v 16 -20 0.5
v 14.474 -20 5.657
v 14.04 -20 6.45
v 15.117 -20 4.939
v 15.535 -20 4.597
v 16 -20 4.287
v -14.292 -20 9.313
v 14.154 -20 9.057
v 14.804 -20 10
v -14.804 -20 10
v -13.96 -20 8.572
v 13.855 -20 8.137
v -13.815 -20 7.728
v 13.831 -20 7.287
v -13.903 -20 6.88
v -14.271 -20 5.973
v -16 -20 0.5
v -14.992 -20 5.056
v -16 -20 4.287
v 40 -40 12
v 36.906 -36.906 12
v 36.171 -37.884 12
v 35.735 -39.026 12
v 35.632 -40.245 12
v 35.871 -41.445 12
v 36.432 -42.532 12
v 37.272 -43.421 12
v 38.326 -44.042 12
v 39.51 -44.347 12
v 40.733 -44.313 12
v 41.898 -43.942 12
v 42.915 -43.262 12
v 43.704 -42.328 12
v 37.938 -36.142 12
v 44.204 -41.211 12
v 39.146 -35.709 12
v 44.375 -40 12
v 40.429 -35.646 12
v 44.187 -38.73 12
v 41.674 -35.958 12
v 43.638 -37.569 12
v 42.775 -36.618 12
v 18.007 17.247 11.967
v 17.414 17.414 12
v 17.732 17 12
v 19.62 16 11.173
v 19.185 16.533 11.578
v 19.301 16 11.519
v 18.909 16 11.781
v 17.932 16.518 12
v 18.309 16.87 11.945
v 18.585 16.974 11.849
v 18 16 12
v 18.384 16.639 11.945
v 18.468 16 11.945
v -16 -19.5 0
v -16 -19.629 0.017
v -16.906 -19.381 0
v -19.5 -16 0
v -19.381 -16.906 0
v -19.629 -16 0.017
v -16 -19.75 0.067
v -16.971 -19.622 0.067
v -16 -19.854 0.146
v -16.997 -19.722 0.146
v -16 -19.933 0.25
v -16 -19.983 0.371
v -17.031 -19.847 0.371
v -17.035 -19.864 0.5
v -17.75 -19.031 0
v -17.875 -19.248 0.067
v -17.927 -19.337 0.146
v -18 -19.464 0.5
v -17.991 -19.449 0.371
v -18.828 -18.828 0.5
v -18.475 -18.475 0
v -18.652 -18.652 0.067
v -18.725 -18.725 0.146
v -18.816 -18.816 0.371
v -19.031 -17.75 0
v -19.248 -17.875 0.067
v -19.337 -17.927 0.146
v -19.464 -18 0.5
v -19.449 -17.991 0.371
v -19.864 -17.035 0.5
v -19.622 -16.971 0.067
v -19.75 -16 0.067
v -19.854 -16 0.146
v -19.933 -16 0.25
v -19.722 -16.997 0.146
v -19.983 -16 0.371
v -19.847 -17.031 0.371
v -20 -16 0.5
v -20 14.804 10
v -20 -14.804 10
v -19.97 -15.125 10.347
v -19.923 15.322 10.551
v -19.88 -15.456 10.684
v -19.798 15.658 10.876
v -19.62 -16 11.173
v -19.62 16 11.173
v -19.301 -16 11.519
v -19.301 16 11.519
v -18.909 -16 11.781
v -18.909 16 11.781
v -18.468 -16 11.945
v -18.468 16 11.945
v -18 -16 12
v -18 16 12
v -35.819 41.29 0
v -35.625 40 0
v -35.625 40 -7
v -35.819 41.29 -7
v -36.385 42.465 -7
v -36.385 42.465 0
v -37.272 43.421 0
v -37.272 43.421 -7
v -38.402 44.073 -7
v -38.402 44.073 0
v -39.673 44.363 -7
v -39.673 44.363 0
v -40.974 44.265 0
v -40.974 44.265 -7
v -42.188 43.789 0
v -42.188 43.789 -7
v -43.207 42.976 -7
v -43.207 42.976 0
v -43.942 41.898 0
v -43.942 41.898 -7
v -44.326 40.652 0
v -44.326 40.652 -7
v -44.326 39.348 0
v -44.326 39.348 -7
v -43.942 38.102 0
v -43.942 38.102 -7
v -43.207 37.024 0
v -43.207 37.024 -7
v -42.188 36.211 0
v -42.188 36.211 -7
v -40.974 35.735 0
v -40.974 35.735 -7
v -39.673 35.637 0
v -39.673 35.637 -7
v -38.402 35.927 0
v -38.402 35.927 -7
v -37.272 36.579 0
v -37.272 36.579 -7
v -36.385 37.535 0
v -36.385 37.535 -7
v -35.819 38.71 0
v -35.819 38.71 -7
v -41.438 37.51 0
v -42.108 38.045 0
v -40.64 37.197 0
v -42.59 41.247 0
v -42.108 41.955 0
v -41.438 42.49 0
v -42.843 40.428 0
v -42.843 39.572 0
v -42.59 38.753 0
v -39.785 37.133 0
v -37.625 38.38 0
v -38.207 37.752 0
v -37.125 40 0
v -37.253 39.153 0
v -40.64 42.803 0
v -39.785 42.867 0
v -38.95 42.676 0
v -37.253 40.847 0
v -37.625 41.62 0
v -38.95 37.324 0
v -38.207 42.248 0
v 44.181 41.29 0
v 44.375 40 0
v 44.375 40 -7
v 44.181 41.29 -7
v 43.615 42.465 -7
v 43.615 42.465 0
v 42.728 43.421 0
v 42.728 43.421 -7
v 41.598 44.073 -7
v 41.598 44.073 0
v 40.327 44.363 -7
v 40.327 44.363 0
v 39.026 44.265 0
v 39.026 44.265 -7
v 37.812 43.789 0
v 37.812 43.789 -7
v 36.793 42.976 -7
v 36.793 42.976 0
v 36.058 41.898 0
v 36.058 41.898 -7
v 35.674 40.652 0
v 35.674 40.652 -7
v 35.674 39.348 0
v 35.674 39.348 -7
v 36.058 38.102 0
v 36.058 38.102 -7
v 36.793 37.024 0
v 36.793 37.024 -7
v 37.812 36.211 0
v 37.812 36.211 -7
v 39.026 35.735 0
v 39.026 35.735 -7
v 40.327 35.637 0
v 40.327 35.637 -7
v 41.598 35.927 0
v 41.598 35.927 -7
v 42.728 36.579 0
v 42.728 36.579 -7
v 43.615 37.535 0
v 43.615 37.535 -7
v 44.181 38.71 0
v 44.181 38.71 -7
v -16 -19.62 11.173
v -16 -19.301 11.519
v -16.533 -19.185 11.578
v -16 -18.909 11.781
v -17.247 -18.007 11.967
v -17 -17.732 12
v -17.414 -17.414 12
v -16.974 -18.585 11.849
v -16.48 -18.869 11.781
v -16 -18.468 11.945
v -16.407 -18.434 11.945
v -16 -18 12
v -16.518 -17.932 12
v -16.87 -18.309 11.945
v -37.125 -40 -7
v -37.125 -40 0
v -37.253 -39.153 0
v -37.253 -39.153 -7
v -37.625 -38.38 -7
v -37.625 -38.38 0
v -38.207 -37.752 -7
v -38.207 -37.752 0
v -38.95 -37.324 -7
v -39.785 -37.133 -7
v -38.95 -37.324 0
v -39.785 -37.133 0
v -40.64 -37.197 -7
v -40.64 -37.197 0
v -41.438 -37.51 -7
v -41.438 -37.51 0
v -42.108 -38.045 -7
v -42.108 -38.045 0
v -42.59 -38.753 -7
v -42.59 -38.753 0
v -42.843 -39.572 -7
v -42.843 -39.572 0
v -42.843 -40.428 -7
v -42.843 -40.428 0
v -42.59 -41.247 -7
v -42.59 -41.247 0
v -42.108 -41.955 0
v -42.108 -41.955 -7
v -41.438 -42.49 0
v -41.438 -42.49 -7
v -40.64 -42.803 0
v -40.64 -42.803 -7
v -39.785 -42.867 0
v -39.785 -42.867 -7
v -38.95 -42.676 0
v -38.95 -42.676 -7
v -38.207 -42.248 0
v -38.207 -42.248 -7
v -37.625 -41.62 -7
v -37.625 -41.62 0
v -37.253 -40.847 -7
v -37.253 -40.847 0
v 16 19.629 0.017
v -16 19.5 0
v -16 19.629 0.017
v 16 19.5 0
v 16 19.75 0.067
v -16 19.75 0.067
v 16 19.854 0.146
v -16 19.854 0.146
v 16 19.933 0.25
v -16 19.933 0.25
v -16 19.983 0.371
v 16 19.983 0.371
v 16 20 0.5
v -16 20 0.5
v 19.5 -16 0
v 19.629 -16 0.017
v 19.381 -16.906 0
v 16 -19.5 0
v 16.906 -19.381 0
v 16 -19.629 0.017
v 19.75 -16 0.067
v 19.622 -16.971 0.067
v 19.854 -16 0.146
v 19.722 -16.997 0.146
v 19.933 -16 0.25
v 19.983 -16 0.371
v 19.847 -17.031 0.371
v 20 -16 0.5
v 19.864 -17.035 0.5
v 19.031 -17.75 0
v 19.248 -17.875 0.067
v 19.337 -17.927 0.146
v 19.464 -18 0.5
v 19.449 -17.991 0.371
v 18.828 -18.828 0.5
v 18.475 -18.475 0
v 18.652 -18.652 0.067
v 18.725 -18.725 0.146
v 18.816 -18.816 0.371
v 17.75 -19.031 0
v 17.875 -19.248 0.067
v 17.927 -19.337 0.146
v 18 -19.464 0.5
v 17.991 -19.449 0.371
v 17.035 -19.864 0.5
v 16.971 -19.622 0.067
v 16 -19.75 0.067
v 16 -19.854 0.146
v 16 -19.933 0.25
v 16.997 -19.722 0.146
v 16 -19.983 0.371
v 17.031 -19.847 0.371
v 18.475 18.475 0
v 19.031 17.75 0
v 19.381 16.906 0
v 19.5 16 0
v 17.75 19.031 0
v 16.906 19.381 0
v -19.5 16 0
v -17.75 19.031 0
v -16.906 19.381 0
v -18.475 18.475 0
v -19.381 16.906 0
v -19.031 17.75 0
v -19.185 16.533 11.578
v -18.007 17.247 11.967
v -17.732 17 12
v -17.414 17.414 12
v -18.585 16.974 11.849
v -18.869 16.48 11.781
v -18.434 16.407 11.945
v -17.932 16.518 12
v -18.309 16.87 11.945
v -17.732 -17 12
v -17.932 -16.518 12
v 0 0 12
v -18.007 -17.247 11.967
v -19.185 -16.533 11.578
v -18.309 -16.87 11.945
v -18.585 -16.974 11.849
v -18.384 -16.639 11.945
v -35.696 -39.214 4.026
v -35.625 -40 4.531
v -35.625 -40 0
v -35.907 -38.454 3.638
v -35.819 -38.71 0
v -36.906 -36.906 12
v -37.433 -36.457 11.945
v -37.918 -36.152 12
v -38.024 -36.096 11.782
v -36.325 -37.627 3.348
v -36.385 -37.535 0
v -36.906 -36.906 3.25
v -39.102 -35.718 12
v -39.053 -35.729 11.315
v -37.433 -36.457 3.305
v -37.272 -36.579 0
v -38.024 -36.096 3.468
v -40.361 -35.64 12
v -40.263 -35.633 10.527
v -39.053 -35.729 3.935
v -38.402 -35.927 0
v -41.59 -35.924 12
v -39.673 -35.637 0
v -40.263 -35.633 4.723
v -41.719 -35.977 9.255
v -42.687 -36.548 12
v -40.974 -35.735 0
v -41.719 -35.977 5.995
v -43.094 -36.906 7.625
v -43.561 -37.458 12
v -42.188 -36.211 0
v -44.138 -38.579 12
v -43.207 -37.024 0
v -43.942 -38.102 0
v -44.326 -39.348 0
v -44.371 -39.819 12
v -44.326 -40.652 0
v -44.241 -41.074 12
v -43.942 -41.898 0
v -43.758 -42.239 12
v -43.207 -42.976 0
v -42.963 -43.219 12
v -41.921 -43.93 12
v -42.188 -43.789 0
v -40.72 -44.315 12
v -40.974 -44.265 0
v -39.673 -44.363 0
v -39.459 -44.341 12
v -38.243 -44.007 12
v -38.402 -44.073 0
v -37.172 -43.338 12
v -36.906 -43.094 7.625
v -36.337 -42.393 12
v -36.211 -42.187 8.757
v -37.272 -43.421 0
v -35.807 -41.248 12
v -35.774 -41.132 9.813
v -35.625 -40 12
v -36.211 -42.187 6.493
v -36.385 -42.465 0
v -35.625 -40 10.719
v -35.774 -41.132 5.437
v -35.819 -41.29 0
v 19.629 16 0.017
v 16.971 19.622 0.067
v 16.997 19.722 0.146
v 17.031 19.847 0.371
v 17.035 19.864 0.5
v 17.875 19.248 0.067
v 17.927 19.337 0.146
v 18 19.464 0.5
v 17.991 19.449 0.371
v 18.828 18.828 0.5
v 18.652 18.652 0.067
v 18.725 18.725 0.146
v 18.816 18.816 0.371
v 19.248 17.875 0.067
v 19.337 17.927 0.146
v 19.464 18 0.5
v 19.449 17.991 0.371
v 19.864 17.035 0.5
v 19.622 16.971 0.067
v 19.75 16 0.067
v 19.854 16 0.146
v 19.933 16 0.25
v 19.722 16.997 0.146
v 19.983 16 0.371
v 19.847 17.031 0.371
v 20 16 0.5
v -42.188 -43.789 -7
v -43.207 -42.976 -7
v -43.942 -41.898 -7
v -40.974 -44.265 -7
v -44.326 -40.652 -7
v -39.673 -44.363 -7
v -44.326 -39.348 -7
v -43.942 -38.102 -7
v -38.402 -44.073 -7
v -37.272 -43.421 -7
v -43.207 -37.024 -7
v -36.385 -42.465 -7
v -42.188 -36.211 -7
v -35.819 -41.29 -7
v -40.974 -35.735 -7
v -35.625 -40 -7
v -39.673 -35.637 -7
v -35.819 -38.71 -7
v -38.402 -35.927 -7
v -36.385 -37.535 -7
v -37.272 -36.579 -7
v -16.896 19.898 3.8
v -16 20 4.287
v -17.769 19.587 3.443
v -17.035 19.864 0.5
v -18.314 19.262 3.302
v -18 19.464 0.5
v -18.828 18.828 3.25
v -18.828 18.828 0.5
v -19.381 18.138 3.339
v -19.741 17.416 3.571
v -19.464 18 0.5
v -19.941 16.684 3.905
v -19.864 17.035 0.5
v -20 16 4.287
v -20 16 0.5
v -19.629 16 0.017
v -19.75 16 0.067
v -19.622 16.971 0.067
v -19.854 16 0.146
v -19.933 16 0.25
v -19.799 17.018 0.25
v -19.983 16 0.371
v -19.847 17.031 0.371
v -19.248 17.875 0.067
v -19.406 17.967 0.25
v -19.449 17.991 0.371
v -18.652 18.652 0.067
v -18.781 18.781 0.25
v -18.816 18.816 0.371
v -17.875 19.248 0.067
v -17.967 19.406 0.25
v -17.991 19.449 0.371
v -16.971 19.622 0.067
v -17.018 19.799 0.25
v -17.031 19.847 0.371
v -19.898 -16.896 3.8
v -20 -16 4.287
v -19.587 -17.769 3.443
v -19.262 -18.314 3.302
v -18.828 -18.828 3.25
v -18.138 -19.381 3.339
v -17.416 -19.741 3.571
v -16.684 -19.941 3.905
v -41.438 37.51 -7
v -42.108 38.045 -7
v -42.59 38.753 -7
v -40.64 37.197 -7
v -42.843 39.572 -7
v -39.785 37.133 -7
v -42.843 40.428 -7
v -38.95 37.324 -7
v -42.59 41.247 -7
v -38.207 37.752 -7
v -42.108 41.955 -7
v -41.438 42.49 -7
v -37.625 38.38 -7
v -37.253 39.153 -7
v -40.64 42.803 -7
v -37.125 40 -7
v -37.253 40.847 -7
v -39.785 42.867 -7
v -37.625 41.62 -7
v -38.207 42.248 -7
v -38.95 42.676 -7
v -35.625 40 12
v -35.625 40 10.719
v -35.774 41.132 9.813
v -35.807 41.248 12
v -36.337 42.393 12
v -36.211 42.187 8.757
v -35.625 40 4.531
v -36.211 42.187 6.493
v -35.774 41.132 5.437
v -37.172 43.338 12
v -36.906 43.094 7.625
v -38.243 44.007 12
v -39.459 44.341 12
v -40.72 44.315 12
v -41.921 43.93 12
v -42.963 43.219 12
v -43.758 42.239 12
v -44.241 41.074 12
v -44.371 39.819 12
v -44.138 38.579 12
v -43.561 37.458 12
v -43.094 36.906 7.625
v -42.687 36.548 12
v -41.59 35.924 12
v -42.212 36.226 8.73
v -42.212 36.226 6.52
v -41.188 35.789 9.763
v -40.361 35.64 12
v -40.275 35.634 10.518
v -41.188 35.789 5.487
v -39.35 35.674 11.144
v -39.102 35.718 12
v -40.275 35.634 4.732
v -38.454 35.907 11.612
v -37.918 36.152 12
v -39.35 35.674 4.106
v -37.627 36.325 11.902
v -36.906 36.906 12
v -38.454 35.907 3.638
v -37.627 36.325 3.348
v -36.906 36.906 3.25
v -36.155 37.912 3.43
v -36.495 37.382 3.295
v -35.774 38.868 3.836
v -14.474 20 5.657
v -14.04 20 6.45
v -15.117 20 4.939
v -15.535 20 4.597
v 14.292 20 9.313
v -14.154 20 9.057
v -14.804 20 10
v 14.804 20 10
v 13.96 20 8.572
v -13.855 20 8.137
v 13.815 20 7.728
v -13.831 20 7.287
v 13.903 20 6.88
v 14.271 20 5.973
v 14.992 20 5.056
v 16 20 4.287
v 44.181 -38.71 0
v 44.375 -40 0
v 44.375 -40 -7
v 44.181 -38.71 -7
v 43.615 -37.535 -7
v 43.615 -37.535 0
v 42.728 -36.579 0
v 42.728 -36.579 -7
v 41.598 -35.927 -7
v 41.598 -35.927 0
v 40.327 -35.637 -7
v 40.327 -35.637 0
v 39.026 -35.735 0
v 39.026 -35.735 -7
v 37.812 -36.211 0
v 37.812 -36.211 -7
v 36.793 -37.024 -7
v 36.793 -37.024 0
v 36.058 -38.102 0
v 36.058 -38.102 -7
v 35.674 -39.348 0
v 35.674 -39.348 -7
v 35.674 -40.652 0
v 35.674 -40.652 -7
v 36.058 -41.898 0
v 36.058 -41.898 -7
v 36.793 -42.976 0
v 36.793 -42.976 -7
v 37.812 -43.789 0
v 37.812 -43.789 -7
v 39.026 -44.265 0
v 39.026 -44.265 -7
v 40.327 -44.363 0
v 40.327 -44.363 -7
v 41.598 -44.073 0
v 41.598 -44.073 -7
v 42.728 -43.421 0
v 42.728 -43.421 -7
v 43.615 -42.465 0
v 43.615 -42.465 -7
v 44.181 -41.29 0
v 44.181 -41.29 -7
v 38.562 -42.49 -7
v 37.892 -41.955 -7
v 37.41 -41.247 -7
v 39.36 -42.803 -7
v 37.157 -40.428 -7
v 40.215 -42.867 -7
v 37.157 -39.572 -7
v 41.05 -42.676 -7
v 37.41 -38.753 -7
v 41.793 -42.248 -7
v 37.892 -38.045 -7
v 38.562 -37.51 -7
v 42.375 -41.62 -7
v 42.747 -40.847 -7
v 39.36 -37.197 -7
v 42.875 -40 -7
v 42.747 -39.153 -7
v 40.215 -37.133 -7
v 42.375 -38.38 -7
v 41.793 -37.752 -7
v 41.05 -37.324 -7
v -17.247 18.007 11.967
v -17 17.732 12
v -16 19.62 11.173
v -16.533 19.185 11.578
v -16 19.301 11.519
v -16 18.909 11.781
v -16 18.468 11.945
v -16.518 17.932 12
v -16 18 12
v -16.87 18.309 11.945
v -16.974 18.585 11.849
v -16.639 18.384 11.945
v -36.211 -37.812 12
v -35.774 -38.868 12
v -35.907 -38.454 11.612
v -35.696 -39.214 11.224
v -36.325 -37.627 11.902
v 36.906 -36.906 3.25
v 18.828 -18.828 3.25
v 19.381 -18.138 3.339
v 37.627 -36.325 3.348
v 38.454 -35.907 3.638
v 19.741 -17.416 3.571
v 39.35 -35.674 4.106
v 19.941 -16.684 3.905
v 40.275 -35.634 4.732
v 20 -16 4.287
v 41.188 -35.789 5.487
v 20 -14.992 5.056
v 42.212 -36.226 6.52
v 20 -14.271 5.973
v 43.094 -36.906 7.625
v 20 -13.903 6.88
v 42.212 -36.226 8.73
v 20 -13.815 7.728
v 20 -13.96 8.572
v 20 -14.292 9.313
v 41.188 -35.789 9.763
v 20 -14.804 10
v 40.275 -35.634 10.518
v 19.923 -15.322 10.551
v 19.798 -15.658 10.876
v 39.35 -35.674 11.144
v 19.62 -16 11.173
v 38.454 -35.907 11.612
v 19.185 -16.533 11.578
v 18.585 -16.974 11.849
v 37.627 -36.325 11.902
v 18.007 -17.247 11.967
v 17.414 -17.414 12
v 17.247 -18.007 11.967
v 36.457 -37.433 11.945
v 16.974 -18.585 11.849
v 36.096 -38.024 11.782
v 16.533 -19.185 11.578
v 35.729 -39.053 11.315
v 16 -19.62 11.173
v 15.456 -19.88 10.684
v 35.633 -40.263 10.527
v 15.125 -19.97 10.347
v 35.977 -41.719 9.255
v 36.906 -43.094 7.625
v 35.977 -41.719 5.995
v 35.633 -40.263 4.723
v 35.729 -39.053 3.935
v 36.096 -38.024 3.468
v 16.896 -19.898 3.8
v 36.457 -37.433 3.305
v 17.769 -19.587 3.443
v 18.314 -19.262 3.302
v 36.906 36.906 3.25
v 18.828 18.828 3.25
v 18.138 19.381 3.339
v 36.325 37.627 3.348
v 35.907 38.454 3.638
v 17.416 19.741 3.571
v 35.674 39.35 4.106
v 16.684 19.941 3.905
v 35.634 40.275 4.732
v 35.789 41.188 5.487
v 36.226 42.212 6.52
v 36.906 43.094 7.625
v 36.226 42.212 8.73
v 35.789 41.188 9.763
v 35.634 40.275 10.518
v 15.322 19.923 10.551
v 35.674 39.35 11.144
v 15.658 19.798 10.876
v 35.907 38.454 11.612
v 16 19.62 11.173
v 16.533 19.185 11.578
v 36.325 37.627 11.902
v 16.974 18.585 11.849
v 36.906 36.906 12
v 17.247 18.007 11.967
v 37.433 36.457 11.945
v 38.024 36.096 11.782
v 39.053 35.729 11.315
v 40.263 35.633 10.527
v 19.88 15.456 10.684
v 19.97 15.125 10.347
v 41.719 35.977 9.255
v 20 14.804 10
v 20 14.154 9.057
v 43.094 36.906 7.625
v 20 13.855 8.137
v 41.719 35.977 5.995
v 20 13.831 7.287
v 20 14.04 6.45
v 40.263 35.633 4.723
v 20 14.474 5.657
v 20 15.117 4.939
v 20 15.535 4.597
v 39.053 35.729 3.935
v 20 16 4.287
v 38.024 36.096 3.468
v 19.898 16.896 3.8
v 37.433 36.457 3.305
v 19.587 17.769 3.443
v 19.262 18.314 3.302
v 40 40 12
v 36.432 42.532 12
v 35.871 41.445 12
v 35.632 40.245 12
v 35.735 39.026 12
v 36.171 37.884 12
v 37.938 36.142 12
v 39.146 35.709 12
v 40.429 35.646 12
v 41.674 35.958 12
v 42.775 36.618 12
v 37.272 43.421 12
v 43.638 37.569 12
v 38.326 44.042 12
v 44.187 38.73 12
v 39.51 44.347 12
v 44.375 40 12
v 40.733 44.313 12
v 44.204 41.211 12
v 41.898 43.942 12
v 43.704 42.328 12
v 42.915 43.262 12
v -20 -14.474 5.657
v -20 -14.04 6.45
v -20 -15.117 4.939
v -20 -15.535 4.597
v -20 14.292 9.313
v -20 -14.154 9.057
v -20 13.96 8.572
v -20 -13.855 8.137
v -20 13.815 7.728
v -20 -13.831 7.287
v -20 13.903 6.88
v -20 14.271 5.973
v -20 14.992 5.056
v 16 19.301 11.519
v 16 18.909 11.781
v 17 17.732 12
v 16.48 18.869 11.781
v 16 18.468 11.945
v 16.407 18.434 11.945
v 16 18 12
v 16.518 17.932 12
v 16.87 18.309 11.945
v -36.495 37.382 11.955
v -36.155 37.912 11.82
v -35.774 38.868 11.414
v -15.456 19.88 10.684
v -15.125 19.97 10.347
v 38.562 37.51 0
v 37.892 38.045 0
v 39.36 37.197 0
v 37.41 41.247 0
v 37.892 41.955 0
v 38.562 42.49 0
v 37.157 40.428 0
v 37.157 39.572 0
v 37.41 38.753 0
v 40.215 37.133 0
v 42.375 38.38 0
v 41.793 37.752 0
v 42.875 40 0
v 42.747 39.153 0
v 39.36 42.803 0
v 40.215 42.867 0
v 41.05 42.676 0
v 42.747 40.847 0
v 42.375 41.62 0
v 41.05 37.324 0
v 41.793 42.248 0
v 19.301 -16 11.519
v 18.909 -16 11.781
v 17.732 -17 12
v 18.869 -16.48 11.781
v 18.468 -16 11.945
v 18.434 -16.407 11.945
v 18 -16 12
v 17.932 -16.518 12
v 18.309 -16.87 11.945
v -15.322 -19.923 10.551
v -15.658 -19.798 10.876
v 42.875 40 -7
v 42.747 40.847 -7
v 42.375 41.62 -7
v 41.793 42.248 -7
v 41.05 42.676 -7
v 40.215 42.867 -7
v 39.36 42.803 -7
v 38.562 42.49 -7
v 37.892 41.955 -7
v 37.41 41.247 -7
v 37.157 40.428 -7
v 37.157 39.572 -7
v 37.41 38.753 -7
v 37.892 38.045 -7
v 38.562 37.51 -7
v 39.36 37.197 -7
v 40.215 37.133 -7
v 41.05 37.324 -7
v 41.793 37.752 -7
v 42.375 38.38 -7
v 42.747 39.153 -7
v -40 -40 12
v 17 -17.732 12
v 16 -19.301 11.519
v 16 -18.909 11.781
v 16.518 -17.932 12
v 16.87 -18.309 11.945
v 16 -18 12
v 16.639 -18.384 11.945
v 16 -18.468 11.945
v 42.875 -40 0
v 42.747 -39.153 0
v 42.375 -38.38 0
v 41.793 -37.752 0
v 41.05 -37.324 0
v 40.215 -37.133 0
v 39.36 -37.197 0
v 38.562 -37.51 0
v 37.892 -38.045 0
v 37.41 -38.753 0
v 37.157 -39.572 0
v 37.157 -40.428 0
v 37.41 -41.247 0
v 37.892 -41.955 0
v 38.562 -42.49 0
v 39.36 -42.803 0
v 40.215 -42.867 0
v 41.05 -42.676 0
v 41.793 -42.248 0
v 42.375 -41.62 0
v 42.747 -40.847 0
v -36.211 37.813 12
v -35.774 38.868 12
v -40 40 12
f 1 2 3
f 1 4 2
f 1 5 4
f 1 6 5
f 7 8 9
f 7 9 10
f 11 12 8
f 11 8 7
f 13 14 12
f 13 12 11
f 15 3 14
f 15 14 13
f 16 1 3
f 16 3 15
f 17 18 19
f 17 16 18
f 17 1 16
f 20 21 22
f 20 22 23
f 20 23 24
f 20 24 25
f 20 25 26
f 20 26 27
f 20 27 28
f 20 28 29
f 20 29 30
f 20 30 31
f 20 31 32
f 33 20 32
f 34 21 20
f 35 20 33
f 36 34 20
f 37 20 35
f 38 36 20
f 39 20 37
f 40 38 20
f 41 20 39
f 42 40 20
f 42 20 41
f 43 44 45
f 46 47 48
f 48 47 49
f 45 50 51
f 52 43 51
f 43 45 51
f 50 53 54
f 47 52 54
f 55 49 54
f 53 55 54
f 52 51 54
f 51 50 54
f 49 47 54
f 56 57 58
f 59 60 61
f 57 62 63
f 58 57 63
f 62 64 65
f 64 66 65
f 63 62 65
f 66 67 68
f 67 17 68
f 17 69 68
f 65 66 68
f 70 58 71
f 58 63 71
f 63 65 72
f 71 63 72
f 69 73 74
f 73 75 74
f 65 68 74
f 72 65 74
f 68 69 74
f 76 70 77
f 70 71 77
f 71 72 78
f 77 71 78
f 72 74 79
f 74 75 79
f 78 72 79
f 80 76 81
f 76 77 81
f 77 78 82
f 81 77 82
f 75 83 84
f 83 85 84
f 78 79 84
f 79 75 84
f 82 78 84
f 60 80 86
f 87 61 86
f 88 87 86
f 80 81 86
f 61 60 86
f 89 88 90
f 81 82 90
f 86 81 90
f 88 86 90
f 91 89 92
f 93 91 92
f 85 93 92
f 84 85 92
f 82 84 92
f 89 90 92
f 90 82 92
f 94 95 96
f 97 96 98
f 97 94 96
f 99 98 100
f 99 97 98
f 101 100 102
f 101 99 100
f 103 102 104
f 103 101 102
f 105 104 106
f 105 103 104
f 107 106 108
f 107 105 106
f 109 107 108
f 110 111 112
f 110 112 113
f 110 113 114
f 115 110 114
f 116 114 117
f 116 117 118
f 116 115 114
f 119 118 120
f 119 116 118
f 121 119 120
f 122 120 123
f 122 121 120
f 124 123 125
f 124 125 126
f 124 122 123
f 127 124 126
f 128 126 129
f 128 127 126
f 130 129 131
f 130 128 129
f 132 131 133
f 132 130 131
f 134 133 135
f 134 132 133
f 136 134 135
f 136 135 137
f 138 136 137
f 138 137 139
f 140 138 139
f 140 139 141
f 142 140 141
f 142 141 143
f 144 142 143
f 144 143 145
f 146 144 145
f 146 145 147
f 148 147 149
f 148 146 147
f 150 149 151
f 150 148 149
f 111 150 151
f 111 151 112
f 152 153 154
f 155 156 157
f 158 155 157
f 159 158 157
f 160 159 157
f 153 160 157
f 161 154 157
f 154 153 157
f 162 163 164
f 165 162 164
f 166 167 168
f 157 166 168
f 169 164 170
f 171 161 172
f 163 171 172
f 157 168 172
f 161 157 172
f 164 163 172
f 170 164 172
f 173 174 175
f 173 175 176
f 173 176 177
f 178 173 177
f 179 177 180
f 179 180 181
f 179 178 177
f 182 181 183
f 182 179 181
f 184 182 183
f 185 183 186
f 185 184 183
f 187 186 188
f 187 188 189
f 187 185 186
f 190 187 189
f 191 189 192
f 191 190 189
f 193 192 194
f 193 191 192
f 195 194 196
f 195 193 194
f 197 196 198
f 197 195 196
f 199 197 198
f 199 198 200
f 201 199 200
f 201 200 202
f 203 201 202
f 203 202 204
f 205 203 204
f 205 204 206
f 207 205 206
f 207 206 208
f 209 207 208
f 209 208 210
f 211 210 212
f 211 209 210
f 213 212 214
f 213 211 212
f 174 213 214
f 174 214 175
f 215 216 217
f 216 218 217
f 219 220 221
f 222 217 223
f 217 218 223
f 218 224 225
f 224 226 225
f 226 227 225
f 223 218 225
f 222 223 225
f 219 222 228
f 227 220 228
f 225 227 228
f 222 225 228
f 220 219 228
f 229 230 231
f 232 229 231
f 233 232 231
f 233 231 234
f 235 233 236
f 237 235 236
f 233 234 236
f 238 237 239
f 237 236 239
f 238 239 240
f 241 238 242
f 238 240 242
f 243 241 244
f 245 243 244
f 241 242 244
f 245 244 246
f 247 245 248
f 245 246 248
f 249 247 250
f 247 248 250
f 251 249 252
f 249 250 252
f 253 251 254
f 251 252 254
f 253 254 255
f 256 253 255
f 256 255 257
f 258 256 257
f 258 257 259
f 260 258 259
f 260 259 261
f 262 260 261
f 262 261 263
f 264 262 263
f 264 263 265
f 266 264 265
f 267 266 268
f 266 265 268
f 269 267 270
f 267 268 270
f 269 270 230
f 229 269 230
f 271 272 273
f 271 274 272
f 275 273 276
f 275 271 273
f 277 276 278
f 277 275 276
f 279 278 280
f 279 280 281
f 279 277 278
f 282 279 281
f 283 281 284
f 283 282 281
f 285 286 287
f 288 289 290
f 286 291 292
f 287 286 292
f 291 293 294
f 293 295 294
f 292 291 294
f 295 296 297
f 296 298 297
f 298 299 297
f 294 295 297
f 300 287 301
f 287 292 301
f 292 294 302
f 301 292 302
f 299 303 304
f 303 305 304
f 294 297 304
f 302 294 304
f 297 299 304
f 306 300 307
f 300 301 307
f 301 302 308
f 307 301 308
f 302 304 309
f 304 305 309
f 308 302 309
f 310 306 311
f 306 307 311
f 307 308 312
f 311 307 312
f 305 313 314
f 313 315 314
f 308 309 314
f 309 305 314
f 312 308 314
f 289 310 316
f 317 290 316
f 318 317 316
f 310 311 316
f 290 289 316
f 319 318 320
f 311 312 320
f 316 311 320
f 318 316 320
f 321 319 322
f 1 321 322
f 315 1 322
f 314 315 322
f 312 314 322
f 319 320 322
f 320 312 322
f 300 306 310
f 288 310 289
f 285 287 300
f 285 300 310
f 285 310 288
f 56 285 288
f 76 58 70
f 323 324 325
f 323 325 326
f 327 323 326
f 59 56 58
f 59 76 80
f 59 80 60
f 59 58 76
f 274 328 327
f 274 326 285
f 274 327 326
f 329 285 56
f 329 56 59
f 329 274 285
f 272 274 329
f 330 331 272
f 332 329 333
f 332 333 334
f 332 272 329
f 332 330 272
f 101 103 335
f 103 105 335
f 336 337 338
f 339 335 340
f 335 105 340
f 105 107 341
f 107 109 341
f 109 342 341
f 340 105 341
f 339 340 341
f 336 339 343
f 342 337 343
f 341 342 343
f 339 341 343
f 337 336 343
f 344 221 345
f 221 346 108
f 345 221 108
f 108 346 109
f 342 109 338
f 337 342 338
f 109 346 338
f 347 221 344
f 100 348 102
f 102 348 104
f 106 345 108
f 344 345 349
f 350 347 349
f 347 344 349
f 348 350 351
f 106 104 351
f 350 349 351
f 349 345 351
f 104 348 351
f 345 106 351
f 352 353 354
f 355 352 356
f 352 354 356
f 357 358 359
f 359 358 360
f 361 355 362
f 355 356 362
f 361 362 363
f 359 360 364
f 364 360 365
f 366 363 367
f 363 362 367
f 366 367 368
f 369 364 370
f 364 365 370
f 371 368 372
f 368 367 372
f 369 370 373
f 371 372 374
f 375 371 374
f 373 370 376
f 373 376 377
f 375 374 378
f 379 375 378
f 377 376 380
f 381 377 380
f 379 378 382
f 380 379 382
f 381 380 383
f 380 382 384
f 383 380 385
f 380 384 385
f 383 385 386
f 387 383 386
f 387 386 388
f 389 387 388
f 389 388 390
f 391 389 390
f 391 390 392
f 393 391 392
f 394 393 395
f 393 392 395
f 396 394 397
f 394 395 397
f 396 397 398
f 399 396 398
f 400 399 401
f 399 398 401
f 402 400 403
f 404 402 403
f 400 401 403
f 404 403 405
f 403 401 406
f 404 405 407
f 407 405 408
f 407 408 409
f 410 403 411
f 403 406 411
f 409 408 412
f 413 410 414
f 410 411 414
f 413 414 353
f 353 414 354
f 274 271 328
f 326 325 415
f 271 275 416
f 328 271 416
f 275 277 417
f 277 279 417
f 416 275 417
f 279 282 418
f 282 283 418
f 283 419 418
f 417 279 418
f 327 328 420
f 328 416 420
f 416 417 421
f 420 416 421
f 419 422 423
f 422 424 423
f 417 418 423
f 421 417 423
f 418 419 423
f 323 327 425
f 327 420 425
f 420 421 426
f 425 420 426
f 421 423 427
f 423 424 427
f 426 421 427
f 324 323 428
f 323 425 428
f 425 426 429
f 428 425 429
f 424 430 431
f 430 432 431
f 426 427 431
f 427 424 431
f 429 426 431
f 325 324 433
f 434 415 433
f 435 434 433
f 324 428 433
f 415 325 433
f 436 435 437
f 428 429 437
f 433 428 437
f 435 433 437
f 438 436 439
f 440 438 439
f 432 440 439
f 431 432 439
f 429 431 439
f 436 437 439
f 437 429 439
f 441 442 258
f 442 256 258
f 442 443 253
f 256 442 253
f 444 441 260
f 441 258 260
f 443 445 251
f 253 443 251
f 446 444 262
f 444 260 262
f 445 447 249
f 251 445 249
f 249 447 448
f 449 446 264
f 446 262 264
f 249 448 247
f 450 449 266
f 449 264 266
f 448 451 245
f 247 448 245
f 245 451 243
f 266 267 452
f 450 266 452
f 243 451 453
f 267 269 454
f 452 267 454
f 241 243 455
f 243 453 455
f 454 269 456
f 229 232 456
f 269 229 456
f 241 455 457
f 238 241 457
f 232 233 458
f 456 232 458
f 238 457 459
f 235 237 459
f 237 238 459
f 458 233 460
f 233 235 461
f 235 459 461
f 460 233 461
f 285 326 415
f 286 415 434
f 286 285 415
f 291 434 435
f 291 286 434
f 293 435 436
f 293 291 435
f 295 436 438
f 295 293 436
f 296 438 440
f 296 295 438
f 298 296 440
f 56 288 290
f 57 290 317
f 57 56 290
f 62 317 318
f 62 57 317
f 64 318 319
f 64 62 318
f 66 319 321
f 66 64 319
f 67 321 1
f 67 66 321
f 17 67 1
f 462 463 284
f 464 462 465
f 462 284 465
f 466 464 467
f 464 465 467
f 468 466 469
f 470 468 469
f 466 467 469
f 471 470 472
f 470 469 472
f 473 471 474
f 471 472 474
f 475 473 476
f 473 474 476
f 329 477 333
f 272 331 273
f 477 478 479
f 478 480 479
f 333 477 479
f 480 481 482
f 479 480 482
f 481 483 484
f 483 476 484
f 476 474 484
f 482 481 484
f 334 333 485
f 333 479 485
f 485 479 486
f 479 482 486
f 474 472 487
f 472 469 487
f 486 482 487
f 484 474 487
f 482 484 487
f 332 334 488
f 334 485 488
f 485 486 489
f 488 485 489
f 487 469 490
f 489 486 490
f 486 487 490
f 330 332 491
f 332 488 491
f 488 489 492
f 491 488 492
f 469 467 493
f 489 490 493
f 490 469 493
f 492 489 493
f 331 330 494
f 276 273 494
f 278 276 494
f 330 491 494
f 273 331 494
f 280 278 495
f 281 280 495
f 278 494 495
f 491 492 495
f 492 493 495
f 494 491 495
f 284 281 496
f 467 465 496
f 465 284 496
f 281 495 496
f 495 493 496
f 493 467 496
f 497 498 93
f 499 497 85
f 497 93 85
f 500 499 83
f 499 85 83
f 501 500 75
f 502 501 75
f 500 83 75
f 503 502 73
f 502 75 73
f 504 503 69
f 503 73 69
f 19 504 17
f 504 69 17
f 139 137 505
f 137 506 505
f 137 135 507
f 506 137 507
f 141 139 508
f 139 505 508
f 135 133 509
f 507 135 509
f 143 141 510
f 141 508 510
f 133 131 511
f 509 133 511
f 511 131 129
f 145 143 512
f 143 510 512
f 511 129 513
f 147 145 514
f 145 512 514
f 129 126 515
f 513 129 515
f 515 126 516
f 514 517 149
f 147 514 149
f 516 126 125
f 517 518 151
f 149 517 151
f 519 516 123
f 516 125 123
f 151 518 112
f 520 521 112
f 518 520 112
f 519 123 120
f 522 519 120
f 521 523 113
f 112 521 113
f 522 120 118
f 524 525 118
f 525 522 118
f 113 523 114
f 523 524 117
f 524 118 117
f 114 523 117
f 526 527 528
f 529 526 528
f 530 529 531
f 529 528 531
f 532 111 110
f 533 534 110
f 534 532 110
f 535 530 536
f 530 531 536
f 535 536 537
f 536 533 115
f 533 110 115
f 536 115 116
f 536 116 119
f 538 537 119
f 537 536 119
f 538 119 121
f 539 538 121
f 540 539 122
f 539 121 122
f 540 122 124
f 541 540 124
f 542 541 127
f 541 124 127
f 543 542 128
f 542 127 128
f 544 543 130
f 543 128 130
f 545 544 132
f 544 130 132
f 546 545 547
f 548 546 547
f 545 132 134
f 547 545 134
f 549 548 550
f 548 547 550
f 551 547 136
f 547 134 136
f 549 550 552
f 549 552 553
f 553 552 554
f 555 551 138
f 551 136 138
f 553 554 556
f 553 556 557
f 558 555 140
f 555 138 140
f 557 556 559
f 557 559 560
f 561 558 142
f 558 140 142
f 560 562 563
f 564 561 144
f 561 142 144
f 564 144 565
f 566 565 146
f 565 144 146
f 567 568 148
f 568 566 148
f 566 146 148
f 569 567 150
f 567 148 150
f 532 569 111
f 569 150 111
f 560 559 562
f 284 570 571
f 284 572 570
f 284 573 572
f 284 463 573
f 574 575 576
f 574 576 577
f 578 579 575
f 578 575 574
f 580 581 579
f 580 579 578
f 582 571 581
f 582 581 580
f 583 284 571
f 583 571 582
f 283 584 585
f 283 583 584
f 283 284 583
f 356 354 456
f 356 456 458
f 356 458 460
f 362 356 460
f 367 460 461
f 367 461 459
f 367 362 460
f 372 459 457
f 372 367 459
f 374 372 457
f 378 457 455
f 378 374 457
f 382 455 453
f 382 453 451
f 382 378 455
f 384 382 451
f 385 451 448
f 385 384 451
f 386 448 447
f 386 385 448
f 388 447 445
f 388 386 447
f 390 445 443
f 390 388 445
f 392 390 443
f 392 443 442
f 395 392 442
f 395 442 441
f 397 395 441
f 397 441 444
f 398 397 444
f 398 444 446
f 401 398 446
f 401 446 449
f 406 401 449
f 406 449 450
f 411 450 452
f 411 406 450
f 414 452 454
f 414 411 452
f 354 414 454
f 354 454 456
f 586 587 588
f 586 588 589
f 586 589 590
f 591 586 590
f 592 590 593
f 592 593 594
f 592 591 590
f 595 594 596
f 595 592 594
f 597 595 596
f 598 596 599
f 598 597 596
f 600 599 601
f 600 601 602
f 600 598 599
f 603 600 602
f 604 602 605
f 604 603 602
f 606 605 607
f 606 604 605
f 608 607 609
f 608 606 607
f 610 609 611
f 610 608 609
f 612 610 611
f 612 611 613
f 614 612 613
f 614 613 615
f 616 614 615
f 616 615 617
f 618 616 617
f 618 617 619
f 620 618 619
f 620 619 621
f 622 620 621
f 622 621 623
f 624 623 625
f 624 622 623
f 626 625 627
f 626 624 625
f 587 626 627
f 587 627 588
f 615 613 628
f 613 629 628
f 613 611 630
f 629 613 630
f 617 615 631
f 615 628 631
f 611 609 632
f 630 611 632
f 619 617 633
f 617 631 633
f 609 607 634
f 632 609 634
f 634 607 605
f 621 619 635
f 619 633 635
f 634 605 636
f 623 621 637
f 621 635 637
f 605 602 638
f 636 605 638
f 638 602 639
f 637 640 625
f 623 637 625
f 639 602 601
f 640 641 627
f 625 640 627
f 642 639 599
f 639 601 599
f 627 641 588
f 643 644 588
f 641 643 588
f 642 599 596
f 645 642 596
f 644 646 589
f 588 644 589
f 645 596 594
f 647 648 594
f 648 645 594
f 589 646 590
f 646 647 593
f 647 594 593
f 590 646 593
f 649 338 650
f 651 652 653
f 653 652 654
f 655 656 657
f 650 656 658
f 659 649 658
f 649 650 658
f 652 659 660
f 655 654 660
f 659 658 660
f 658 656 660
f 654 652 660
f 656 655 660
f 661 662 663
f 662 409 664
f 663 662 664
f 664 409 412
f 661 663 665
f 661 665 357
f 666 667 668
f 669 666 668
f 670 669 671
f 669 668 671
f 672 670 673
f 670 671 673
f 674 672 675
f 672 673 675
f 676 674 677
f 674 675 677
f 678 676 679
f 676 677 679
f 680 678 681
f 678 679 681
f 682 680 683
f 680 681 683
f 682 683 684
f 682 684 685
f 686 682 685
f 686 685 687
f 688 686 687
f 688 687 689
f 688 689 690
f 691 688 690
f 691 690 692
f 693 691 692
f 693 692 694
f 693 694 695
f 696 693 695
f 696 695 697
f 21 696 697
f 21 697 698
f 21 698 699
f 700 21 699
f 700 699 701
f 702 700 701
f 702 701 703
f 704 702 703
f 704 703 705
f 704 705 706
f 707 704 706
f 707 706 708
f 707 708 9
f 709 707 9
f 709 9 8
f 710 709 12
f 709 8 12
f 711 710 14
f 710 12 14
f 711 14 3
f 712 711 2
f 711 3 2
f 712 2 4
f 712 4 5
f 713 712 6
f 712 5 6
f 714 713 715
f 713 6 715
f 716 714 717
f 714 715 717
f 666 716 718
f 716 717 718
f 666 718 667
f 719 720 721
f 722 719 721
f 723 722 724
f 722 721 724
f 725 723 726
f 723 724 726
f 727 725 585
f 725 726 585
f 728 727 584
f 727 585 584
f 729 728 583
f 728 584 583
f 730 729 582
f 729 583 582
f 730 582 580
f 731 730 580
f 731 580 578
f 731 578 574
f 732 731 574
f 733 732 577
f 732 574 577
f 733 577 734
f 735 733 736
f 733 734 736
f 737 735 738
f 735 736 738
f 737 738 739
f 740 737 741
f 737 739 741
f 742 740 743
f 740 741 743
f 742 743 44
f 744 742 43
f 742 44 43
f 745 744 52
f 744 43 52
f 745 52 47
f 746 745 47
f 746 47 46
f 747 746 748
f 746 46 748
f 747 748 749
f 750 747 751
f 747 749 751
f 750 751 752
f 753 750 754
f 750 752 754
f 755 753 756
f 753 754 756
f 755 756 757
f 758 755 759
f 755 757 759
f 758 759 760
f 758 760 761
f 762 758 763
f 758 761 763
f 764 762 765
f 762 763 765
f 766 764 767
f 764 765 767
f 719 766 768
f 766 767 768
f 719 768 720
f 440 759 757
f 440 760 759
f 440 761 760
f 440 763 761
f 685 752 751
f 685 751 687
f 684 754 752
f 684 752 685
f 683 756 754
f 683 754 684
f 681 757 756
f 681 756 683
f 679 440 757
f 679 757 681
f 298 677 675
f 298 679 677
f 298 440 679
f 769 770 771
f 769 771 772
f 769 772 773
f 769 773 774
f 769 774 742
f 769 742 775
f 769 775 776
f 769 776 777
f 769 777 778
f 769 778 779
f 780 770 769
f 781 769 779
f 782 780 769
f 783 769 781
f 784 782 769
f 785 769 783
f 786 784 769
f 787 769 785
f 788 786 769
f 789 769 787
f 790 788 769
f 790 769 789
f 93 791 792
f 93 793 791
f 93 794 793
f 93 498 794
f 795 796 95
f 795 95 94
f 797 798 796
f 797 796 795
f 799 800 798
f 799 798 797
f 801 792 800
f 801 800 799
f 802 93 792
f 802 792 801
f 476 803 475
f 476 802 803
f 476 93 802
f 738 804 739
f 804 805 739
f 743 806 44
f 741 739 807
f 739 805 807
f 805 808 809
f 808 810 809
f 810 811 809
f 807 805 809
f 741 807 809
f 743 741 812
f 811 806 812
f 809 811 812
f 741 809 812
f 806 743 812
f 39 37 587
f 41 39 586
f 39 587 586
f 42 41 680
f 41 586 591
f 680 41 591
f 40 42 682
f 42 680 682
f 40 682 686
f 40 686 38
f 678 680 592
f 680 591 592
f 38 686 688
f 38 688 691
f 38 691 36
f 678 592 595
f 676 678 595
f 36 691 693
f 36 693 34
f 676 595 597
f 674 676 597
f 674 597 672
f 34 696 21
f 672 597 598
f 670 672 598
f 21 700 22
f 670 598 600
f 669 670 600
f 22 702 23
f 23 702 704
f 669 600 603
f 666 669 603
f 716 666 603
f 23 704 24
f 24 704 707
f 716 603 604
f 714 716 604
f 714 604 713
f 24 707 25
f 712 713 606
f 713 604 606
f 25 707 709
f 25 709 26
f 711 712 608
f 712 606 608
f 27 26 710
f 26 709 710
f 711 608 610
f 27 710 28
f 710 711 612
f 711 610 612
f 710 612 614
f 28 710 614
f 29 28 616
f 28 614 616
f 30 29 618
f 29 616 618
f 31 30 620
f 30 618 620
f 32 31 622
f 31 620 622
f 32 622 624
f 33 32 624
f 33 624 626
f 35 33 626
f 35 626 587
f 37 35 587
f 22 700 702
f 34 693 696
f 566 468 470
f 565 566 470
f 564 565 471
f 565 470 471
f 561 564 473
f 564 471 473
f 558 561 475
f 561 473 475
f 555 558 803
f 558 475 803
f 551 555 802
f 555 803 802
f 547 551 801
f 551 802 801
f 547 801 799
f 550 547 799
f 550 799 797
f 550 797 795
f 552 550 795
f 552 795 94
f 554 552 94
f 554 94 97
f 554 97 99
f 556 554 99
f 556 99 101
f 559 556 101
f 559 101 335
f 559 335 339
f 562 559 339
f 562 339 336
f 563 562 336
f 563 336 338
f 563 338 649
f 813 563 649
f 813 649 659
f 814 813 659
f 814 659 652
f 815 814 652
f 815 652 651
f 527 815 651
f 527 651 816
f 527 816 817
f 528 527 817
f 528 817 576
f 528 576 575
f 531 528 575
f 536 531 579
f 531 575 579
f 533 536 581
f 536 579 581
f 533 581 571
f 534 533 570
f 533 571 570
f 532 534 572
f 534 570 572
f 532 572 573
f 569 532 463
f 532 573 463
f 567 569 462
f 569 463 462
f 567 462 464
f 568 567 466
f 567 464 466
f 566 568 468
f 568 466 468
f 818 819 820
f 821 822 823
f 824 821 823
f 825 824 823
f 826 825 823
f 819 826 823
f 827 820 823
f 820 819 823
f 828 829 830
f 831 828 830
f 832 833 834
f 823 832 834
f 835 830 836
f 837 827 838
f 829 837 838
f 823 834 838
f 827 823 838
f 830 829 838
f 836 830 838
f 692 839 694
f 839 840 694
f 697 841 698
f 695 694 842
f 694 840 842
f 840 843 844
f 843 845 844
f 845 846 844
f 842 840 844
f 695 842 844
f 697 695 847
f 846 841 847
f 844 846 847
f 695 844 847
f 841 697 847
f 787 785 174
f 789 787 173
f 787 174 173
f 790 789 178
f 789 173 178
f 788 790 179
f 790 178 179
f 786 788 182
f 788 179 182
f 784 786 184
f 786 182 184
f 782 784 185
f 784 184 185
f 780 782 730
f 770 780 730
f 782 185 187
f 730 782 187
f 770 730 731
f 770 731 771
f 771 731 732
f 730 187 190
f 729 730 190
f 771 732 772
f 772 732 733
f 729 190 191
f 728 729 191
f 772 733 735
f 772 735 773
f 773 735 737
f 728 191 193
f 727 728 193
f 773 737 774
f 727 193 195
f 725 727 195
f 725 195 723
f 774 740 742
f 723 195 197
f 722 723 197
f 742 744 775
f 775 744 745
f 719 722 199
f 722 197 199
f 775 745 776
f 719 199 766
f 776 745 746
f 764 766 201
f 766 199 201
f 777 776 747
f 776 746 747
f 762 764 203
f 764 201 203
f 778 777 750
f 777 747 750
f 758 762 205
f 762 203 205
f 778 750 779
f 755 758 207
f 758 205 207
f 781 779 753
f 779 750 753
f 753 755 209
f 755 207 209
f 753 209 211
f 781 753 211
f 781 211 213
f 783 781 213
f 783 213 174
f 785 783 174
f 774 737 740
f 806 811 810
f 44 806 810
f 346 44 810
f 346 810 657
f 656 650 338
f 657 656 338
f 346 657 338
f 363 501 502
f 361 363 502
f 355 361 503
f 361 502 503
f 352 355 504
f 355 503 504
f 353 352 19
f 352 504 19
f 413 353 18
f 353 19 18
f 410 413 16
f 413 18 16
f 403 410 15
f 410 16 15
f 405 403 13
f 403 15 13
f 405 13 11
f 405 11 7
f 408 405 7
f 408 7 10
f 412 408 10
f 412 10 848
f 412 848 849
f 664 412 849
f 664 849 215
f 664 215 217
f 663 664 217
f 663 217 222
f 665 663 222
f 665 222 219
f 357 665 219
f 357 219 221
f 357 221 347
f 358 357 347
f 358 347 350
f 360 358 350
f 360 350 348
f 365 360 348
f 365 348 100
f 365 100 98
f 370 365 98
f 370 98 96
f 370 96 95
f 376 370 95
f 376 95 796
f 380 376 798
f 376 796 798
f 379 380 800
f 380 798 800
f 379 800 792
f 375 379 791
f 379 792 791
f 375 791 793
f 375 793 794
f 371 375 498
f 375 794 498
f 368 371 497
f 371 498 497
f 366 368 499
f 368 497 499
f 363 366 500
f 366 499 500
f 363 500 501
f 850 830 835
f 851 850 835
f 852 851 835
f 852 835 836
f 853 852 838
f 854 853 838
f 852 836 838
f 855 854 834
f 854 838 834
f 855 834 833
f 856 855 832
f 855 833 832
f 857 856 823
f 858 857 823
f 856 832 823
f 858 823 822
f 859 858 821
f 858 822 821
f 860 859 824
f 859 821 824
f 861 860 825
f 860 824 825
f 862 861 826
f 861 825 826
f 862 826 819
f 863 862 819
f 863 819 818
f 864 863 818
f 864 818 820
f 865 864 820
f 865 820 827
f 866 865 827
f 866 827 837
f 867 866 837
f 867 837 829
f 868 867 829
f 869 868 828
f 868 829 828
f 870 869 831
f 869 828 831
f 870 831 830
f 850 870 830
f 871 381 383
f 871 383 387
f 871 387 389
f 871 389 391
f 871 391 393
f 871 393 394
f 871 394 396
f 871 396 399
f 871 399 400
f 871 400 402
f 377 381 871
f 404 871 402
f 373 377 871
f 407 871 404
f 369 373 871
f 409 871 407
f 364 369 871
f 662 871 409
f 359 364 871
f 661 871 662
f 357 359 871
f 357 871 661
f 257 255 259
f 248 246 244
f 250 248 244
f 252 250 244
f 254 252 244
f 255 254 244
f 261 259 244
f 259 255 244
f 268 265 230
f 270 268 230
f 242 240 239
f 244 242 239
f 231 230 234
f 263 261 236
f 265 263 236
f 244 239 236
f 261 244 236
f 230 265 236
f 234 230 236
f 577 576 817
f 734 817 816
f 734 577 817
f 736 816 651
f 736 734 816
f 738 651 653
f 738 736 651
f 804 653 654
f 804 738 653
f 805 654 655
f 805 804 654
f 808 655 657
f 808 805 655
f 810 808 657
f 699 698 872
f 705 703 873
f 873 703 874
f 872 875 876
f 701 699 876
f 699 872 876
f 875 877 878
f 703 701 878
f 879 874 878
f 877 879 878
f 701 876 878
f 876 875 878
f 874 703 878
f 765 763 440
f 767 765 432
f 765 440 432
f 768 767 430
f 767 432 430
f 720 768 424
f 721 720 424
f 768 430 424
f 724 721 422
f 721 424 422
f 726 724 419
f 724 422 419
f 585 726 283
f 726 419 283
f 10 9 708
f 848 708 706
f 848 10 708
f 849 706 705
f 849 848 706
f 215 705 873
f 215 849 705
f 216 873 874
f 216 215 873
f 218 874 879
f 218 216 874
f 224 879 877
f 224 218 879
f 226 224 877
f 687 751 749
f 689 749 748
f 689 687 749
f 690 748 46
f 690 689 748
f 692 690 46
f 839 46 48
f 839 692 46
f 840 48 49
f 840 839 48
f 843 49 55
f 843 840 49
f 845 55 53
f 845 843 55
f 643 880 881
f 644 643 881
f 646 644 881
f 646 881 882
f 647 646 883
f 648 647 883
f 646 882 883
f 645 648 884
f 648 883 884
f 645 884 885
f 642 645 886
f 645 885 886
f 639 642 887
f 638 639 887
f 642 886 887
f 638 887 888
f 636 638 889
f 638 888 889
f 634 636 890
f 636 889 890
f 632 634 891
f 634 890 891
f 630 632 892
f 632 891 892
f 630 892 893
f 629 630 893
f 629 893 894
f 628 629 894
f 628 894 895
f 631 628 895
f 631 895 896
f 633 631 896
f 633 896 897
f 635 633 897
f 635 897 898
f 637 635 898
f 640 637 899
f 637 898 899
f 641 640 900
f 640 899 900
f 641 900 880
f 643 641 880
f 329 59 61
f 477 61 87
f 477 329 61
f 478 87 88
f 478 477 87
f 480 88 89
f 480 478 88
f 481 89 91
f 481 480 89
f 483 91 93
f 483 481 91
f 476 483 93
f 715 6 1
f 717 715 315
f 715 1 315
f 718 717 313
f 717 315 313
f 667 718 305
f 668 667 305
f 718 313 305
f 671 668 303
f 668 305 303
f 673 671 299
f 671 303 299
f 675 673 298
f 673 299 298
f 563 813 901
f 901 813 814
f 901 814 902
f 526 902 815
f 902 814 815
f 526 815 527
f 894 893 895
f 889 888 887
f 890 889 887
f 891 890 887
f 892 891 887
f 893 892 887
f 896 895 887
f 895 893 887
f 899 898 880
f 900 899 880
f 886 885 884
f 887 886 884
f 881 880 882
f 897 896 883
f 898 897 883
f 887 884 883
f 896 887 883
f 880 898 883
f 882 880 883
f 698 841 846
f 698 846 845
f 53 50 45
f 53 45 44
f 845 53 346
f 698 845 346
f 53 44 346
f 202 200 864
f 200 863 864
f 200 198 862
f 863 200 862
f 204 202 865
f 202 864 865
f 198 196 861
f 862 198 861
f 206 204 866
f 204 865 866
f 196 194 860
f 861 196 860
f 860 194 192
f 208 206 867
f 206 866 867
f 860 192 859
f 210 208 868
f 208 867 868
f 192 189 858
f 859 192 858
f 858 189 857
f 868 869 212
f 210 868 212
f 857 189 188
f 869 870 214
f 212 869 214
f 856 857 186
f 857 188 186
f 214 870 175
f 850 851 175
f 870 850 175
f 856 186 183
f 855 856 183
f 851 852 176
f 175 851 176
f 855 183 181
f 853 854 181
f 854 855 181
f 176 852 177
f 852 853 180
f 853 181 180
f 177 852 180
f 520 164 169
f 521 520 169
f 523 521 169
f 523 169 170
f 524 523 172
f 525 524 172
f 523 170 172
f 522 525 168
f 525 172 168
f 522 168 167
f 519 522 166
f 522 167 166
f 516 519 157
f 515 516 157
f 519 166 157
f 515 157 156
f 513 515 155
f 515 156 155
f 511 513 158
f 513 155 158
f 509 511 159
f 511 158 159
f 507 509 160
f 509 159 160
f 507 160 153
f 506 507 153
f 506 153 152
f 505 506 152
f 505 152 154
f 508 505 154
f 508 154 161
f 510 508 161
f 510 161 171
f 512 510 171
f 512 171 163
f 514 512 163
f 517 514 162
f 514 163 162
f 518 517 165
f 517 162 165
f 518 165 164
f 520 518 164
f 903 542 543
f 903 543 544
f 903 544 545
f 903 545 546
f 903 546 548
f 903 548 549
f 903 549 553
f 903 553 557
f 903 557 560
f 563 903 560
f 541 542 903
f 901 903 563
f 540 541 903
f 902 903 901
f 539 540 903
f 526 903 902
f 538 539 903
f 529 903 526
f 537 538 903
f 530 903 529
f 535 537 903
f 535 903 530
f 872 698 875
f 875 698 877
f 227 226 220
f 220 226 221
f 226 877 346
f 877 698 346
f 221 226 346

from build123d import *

# Parameters (mm, degrees)
PAD_DEPTH          = 12
FILLET_R           = 2
FILLET001_R        = 0.5
SKETCH001_R        = 4.375
PAD001_DEPTH       = 7
PAD002_DEPTH       = 12
CYLINDER_R         = 4.375
CYLINDER_DEPTH     = 56.568542
POLARPATTERN_COUNT = 4
SKETCH002_R        = 2.875
POCKET_DEPTH       = 7


with BuildPart() as part:
    # Sketch → Pad (new body)
    with BuildSketch(Plane.XY):
        with BuildLine():
            Line((-20, -16), (-20, 16))
            ThreePointArc((-16, 20), (-18.828427, 18.828427), (-20, 16))
            Line((-16, 20), (16, 20))
            ThreePointArc((20, 16), (18.828427, 18.828427), (16, 20))
            Line((20, 16), (20, -16))
            ThreePointArc((16, -20), (18.828427, -18.828427), (20, -16))
            Line((16, -20), (-16, -20))
            ThreePointArc((-20, -16), (-18.828427, -18.828427), (-16, -20))
        make_face()
    extrude(amount=PAD_DEPTH)

    # Fillet
    fillet_edges = [part.edges().sort_by_distance(p)[0] for p in [
        (20, 0, 12),
        (18.828427, -18.828427, 12),
        (0, -20, 12),
        (-18.828427, -18.828427, 12),
        (-20, 0, 12),
        (-18.828427, 18.828427, 12),
        (0, 20, 12),
        (18.828427, 18.828427, 12),
    ]]
    fillet(fillet_edges, radius=FILLET_R)

    # Fillet001
    fillet001_edges = [part.edges().sort_by_distance(p)[0] for p in [
        (0, 20, 0),
        (20, 0, 0),
        (18.828427, 18.828427, 0),
        (-18.828427, 18.828427, 0),
        (-20, 0, 0),
        (-18.828427, -18.828427, 0),
        (0, -20, 0),
        (18.828427, -18.828427, 0),
    ]]
    fillet(fillet001_edges, radius=FILLET001_R)

    # Sketch001 → Pad001 (join)
    with BuildSketch(Plane.XY):
        with Locations((-40, -40)):
            Circle(SKETCH001_R)
        with Locations((40, -40)):
            Circle(SKETCH001_R)
        with Locations((40, 40)):
            Circle(SKETCH001_R)
        with Locations((-40, 40)):
            Circle(SKETCH001_R)
    extrude(amount=-PAD001_DEPTH)

    # Sketch001 → Pad002 (join)
    with BuildSketch(Plane.XY):
        with Locations((-40, -40)):
            Circle(SKETCH001_R)
        with Locations((40, -40)):
            Circle(SKETCH001_R)
        with Locations((40, 40)):
            Circle(SKETCH001_R)
        with Locations((-40, 40)):
            Circle(SKETCH001_R)
    extrude(amount=PAD002_DEPTH)

    # Cylinder → Cylinder (join)
    with BuildSketch(Plane(origin=(0, 0, 7.625), x_dir=(0, 0, -1), z_dir=(0.707107, -0.707107, 0))):
        Circle(CYLINDER_R)
    cylinder = extrude(amount=CYLINDER_DEPTH)

    # PolarPattern: Cylinder ×4 about axis
    polarpattern_axis = Axis((0, 0, 0), (0, 0, 1))
    for i in range(1, POLARPATTERN_COUNT):
        add(cylinder.rotate(polarpattern_axis, i * 360 / POLARPATTERN_COUNT))

    # Sketch002 → Pocket (cut)
    with BuildSketch(Plane.XY):
        with Locations((-40, 40)):
            Circle(SKETCH002_R)
        with Locations((40, 40)):
            Circle(SKETCH002_R)
        with Locations((40, -40)):
            Circle(SKETCH002_R)
        with Locations((-40, -40)):
            Circle(SKETCH002_R)
    extrude(amount=-POCKET_DEPTH, mode=Mode.SUBTRACT)


solid = part.part
